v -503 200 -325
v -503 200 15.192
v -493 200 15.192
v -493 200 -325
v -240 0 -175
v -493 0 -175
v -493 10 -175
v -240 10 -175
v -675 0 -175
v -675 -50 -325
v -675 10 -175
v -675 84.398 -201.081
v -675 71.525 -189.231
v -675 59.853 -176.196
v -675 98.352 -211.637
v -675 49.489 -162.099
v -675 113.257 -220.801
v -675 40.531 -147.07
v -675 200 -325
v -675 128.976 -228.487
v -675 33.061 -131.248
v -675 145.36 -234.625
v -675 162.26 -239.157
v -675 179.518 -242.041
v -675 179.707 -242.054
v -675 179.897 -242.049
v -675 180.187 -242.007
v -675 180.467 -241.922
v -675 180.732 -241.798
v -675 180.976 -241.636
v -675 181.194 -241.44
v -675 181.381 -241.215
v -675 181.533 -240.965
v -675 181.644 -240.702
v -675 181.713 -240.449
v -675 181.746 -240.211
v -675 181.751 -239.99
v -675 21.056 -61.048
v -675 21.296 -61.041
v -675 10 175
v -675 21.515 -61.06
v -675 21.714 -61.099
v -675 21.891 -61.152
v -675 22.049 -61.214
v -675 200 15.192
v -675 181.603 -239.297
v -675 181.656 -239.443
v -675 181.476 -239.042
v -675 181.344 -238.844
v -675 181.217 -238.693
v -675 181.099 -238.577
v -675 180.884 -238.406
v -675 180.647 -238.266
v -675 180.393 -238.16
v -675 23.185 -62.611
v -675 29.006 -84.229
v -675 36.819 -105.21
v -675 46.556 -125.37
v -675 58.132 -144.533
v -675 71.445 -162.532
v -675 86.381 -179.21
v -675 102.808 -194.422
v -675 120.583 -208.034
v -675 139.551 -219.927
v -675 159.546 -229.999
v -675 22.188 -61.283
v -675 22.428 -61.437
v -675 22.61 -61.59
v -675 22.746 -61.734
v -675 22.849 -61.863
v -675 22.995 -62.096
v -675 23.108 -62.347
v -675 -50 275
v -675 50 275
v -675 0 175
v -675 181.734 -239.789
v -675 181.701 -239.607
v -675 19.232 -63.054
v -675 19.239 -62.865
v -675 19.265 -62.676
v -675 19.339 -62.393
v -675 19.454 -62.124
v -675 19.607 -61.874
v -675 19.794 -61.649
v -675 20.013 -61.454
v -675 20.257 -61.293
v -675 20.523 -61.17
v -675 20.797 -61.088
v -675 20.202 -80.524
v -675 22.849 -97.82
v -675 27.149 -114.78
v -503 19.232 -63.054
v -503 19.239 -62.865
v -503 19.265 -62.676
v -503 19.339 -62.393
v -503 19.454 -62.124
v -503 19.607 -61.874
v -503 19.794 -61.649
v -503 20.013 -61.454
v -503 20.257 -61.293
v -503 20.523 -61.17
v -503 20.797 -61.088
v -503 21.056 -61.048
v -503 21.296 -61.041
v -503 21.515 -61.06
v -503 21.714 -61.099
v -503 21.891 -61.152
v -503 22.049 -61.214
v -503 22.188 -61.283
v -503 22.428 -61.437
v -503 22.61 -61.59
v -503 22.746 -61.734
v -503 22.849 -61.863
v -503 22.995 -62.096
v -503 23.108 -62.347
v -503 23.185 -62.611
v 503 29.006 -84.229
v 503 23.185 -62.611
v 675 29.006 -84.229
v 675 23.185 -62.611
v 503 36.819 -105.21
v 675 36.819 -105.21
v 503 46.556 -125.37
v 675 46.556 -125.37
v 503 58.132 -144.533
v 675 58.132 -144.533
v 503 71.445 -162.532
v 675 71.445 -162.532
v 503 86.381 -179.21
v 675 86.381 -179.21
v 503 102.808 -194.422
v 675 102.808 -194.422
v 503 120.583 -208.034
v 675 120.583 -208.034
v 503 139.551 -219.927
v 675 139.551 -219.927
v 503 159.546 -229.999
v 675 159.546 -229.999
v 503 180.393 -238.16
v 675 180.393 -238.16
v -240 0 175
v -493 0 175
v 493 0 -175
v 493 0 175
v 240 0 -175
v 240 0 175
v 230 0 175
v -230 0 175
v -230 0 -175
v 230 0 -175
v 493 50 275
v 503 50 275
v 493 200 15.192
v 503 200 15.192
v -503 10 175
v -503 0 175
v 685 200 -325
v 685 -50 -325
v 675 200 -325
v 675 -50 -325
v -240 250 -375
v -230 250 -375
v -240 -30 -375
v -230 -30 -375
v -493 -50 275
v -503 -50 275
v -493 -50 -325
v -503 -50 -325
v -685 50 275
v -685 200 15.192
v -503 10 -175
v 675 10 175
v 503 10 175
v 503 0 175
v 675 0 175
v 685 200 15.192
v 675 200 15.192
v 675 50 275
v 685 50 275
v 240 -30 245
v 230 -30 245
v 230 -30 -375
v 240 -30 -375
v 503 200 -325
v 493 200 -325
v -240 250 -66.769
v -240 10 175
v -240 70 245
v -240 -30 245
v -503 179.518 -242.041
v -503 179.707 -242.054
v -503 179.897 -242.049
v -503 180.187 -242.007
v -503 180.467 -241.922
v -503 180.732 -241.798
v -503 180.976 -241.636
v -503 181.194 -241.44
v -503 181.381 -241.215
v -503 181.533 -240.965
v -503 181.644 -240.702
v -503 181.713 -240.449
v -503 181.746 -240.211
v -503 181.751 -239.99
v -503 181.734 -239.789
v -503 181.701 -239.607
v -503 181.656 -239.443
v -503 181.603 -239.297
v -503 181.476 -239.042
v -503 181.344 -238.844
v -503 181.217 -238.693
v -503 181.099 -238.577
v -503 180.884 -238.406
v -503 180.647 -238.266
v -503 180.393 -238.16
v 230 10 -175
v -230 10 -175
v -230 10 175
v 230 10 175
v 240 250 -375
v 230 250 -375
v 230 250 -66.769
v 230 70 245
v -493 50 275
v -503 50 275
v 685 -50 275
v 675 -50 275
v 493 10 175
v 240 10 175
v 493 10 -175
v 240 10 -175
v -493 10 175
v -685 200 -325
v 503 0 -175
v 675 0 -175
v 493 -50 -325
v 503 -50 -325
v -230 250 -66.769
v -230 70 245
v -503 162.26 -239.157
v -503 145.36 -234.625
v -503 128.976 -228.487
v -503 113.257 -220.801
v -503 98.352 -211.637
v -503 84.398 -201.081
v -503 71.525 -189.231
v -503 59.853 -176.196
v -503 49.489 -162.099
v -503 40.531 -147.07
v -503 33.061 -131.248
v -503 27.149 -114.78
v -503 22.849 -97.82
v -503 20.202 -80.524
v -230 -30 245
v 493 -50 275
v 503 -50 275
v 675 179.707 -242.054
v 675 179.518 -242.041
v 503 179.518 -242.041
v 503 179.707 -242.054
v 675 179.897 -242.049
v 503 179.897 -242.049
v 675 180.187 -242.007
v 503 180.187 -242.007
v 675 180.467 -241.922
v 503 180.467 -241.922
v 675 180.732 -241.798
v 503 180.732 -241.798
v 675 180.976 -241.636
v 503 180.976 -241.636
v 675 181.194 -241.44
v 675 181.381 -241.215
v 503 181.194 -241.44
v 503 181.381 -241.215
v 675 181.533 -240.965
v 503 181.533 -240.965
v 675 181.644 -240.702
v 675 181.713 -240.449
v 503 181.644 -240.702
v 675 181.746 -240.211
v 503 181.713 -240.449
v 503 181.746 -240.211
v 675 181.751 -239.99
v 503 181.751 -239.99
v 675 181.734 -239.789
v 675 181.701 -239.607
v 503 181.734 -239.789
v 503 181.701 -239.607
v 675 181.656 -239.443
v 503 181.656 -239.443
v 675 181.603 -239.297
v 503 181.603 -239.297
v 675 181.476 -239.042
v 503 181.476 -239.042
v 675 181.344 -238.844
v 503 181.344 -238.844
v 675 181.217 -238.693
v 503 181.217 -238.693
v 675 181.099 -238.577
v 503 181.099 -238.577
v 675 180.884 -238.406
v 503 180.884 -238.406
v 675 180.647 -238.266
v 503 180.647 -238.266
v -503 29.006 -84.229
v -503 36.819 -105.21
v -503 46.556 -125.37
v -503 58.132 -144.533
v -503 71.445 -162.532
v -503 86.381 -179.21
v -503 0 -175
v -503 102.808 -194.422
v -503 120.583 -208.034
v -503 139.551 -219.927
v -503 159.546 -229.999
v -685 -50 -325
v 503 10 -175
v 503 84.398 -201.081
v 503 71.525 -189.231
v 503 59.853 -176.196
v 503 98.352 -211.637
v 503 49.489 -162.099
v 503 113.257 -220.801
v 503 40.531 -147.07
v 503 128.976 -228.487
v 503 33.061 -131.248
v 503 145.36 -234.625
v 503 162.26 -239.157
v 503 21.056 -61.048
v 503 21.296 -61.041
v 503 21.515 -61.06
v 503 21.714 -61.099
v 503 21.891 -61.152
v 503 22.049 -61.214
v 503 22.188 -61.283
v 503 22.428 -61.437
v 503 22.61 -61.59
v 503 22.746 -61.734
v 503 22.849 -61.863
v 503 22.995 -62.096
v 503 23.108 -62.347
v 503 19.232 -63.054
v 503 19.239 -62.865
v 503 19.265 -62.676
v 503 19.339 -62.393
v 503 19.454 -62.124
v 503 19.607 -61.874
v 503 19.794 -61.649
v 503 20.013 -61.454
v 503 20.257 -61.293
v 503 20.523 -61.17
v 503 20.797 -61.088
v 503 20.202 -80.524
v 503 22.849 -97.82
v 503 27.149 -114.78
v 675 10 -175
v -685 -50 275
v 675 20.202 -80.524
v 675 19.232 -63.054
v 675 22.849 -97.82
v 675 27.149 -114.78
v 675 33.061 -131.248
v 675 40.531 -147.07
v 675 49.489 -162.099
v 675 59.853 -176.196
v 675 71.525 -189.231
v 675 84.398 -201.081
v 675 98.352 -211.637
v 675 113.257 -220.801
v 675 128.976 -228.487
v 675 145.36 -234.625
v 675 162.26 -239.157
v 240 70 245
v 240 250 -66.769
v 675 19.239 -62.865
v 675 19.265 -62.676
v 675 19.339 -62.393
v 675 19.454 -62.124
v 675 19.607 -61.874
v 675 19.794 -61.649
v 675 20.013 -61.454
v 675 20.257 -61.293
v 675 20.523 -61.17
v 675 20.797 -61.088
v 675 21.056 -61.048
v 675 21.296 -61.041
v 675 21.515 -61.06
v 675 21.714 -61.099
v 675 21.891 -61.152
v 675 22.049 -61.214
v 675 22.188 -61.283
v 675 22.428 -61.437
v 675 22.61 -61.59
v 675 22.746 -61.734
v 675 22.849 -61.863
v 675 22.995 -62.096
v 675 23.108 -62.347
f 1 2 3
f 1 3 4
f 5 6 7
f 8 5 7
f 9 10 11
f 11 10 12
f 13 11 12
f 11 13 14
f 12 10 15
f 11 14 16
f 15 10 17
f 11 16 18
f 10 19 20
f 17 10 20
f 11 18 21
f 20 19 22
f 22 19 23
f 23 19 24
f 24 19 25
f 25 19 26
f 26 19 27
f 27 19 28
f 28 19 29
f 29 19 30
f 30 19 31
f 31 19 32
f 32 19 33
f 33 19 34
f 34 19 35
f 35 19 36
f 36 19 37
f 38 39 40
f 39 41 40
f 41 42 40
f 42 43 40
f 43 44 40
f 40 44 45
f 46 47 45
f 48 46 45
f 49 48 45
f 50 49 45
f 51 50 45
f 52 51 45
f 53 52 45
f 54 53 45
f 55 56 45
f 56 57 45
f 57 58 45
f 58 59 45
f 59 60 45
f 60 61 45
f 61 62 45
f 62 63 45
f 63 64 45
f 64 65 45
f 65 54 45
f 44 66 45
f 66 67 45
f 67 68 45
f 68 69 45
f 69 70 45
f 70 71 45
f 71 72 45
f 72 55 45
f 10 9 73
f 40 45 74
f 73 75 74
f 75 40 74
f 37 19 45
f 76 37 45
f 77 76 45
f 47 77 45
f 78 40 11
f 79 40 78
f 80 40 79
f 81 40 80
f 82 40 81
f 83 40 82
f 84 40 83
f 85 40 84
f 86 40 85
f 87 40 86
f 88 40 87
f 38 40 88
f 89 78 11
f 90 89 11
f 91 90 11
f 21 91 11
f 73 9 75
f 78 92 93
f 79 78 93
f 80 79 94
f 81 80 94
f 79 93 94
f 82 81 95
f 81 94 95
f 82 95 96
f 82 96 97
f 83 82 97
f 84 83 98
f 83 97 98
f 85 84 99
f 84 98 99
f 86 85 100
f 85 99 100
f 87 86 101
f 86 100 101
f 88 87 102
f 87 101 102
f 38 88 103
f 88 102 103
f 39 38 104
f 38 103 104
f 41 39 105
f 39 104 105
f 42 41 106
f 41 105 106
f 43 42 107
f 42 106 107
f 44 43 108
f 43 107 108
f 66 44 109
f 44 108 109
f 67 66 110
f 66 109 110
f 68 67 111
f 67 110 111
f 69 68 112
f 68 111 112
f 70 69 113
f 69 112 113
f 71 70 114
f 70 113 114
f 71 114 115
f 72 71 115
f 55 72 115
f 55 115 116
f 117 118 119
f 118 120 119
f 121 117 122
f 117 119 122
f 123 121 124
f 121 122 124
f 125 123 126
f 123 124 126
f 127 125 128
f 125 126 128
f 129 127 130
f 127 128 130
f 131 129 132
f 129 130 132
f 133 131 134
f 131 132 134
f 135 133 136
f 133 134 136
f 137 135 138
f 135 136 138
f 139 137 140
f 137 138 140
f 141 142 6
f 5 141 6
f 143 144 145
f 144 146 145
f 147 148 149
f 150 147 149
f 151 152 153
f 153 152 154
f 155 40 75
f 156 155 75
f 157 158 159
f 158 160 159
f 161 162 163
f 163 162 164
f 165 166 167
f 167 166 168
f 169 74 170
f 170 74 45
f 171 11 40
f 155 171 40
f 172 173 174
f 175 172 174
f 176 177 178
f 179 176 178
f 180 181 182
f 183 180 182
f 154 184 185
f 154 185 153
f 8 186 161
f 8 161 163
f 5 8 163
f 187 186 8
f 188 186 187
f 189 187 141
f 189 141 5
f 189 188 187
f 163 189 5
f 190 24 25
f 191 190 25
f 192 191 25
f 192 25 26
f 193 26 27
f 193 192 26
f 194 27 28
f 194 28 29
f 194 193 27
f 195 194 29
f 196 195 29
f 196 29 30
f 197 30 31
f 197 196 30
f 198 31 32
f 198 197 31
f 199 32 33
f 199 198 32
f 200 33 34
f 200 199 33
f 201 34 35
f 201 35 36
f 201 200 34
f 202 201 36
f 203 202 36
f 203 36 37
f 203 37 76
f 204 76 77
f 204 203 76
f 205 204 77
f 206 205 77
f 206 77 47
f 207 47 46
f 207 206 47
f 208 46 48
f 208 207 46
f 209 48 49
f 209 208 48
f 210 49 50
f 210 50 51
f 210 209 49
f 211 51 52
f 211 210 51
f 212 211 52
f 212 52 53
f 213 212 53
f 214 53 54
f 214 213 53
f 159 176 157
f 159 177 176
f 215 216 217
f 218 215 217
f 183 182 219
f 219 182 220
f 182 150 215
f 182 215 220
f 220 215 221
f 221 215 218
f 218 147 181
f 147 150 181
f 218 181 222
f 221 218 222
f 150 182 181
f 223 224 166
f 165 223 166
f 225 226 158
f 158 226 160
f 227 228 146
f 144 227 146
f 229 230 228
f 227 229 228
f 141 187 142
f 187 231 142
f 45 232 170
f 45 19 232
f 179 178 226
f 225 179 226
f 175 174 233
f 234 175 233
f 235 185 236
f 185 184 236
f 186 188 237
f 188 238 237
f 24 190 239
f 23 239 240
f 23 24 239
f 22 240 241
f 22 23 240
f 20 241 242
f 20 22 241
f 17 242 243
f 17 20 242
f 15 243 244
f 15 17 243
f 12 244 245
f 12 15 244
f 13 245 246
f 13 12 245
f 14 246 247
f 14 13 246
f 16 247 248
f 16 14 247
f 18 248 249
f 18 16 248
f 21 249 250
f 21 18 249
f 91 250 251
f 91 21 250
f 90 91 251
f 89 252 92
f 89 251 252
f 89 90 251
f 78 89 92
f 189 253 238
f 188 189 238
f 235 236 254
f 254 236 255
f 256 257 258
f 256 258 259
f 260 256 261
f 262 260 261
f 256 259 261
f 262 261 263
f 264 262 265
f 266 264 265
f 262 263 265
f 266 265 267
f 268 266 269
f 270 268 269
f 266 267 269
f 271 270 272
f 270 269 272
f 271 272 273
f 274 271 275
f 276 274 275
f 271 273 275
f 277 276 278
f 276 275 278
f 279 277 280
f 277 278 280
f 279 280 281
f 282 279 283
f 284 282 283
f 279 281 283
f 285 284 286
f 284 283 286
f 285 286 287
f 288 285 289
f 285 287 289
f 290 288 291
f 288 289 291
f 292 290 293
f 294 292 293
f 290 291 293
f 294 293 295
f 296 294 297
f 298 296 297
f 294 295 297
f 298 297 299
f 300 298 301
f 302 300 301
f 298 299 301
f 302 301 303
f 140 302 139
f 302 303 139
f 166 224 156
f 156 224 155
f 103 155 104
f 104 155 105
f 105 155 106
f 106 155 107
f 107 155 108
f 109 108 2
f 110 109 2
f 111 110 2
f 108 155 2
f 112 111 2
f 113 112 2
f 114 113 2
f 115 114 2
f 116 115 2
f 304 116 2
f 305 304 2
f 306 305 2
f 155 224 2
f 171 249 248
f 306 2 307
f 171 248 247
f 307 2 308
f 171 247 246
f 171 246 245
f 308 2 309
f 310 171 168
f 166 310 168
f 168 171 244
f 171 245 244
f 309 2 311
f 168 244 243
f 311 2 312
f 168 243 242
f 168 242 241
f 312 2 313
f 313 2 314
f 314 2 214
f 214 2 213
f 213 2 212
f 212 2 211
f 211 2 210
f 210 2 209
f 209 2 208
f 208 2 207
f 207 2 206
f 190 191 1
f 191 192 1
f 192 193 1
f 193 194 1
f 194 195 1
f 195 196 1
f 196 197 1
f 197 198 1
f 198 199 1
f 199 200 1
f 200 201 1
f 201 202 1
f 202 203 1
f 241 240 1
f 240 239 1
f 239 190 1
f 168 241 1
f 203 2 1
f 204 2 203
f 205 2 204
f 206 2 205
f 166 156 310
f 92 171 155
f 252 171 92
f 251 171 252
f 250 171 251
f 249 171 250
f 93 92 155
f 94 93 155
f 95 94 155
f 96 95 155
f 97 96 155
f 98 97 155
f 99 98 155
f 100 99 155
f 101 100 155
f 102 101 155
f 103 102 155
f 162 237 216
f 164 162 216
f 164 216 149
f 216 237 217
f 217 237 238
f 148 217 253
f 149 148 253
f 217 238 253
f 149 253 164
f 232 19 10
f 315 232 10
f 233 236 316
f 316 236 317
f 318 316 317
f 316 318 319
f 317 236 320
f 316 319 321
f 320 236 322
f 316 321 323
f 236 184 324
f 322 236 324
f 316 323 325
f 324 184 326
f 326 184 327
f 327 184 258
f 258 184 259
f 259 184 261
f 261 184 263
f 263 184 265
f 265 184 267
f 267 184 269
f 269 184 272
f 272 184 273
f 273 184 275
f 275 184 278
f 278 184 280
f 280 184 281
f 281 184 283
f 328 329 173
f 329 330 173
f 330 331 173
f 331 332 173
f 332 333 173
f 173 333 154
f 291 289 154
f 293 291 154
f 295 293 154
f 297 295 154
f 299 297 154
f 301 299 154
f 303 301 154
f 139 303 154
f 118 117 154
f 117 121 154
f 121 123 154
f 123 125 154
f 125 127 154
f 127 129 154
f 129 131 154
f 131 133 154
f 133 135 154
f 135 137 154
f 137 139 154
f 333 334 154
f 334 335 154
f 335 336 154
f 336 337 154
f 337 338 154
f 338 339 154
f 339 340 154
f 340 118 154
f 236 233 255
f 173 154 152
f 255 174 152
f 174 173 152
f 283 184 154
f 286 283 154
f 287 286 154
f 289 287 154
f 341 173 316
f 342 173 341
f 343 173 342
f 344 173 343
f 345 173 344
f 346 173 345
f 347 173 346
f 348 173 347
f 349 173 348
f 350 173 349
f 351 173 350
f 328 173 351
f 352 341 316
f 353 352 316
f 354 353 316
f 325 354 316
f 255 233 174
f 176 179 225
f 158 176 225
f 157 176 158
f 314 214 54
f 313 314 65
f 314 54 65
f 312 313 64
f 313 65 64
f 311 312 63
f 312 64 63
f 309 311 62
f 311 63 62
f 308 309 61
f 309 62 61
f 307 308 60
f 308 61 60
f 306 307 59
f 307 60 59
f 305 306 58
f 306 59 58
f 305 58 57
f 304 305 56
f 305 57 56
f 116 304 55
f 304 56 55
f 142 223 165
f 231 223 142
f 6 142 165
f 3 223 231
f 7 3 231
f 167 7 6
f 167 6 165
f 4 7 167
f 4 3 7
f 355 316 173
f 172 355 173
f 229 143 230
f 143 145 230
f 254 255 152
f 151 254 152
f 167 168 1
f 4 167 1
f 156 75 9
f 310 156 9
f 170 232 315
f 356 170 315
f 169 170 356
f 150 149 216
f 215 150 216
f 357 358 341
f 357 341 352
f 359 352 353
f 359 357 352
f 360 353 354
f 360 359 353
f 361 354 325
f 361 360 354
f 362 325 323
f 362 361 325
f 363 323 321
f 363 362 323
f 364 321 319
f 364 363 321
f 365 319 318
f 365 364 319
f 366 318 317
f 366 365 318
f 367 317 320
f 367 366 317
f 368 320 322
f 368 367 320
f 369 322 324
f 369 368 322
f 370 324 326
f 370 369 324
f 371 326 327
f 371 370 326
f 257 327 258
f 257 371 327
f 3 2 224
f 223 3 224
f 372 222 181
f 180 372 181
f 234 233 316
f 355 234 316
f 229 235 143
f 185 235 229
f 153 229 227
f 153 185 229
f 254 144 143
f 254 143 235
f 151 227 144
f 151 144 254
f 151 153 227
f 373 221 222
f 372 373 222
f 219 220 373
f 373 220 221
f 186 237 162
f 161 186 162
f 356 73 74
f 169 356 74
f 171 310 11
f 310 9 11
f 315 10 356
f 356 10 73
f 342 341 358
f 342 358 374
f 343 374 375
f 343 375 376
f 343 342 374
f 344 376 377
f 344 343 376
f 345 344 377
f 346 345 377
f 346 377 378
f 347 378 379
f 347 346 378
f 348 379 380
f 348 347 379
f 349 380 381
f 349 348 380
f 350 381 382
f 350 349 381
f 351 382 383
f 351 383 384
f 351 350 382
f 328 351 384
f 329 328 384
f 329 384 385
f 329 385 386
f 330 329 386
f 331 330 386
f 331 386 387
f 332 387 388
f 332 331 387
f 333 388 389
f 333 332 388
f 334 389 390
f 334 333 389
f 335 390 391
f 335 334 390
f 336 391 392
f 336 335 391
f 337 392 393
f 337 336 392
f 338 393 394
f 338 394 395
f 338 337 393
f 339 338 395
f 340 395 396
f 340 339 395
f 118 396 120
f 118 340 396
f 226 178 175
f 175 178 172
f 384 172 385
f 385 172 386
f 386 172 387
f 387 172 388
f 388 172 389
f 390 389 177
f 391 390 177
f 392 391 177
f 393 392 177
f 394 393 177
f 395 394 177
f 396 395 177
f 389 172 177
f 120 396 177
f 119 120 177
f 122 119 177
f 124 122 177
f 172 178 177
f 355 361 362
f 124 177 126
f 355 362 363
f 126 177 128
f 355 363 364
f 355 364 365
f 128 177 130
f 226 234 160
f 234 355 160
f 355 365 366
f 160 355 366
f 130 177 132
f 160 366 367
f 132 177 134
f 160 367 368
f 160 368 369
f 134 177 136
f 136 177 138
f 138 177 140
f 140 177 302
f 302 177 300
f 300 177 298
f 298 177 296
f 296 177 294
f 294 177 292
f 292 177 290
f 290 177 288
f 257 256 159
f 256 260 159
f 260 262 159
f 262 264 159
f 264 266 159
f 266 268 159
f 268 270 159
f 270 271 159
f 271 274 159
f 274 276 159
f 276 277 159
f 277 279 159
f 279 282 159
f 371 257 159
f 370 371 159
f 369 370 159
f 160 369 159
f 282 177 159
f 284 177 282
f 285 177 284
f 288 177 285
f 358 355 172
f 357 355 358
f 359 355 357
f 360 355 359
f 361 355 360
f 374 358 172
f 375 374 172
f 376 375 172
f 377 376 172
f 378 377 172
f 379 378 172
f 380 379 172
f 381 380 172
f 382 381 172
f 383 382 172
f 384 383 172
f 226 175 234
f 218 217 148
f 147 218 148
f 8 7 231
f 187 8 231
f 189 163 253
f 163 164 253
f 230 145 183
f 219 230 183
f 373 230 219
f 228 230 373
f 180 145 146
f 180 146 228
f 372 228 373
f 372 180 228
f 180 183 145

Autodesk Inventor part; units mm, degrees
sketch "スケッチ1" plane through (0, 0, 0) normal (1, 0, 0) x (0, 1, 0)
  line L0 (10, 175) -> (0, 175)
  line L1 (0, 175) -> (0, -175)
  line L2 (0, -175) -> (10, -175)
  line L3 (10, -175) -> (10, 175)
  point P0 (0, 0)
  dimension "d0" = 350
  dimension "d1" = 10
extrude "押し出し1" add sketch "スケッチ1" along normal mid plane 1350
sketch "スケッチ2" plane through (675, 0, 0) normal (1, 0, 0) x (0, 0, -1)
  line L0 (-15.1924, 200) -> (-275, 50)
  line L1 (-275, 50) -> (-275, -50)
  line L2 (-275, -50) -> (325, -50)
  line L3 (325, -50) -> (325, 200)
  line L4 (-175, 0) -> (175, 0) projected
  line L5 (-175, 10) -> (-175, 0) projected
  line L6 (175, 0) -> (175, 10) projected
  line L7 (175, 10) -> (-175, 10) projected
  line L8 (-15.1924, 200) -> (325, 200)
  point P0 (0, 0)
  dimension "d4" = 50
  dimension "d5" = 30
  dimension "d6" = 250
  dimension "d7" = 600
  dimension "d8" = 100
  dimension "d9" = 100
extrude "押し出し3" add sketch "スケッチ2" along normal blind 10 contours L8 L3 L2 L1 L0 | L5 L7 L6 L4
ref_plane "作業平面1" through (230, 0, 0) normal (1, 0, 0) x (0, 1, 0)
ref_plane "作業平面2" through (589, 0, 0) normal (-1, 0, 0) x (0, 0, 1)
ref_plane "作業平面3" through (230, 0, 0) normal (1, 0, 0) x (0, 1, 0)
mirror "ミラー3" about plane through (589, 0, 0) normal (-1, 0, 0) of "押し出し3"
sketch "スケッチ4" plane through (230, 0, 0) normal (1, 0, 0) x (0, 1, 0)
  line L0 (70, 245) -> (-30, 245)
  line L1 (-30, 245) -> (-30, -375)
  line L2 (-30, -375) -> (250, -375)
  line L3 (250, -375) -> (250, -66.7691)
  line L4 (250, -66.7691) -> (70, 245)
  line L5 (0, -505) -> (0, 405) projected
  line L6 (50, 275) -> (-50, 275) projected
  line L7 (-50, 275) -> (-50, -325) projected
  line L8 (-50, -325) -> (200, -325) projected
  line L9 (200, -325) -> (200, 15.1924) projected
  point P0 (0, 0)
  dimension "d26" = 30
  dimension "d27" = 20
  dimension "d28" = 50
  dimension "d29" = 30
  dimension "d30" = 100
  dimension "d44" = 50
extrude "押し出し5" add sketch "スケッチ4" along normal blind 10 contours L4 L3 L2 L5 L0 | L5 L8 L1 L0 | L5 L2 L1 L8
sketch "スケッチ5" plane through (675, 0, 0) normal (-1, 0, 0) x (0, 0, 1)
  arc A0 (-243.2616, 197.5471) -> (-45, 20) centre (-11.1877, 257.2271) ccw
  line L0 (175, 10) -> (-175, 10) projected
  line L1 (-175, 10) -> (-175, 0) projected
  line L2 (-175, 10) -> (-243.2616, 197.5471)
  arc A1 (-243.2616, 197.5471) -> (-45, 20) centre (-61.7359, 200.7814) ccw
  point P0 (0, 0)
  dimension "d36" = 10
  dimension "d37" = 130
  dimension "d42" = 110
extrude "押し出し6" add sketch "スケッチ5" along normal up to next contours A0 L2 A1 | A0 A1 L2
fillet "フィレット1" radius 2 2 edges at (589, 197.5471, -243.2616) (589, 20, -45)
mirror "ミラー6" about plane through (0, 0, 0) normal (1, 0, 0) of "押し出し5", "押し出し3", "ミラー3", "押し出し6", "フィレット1"
properties part number "F-wing" material "PAEK 樹脂"
